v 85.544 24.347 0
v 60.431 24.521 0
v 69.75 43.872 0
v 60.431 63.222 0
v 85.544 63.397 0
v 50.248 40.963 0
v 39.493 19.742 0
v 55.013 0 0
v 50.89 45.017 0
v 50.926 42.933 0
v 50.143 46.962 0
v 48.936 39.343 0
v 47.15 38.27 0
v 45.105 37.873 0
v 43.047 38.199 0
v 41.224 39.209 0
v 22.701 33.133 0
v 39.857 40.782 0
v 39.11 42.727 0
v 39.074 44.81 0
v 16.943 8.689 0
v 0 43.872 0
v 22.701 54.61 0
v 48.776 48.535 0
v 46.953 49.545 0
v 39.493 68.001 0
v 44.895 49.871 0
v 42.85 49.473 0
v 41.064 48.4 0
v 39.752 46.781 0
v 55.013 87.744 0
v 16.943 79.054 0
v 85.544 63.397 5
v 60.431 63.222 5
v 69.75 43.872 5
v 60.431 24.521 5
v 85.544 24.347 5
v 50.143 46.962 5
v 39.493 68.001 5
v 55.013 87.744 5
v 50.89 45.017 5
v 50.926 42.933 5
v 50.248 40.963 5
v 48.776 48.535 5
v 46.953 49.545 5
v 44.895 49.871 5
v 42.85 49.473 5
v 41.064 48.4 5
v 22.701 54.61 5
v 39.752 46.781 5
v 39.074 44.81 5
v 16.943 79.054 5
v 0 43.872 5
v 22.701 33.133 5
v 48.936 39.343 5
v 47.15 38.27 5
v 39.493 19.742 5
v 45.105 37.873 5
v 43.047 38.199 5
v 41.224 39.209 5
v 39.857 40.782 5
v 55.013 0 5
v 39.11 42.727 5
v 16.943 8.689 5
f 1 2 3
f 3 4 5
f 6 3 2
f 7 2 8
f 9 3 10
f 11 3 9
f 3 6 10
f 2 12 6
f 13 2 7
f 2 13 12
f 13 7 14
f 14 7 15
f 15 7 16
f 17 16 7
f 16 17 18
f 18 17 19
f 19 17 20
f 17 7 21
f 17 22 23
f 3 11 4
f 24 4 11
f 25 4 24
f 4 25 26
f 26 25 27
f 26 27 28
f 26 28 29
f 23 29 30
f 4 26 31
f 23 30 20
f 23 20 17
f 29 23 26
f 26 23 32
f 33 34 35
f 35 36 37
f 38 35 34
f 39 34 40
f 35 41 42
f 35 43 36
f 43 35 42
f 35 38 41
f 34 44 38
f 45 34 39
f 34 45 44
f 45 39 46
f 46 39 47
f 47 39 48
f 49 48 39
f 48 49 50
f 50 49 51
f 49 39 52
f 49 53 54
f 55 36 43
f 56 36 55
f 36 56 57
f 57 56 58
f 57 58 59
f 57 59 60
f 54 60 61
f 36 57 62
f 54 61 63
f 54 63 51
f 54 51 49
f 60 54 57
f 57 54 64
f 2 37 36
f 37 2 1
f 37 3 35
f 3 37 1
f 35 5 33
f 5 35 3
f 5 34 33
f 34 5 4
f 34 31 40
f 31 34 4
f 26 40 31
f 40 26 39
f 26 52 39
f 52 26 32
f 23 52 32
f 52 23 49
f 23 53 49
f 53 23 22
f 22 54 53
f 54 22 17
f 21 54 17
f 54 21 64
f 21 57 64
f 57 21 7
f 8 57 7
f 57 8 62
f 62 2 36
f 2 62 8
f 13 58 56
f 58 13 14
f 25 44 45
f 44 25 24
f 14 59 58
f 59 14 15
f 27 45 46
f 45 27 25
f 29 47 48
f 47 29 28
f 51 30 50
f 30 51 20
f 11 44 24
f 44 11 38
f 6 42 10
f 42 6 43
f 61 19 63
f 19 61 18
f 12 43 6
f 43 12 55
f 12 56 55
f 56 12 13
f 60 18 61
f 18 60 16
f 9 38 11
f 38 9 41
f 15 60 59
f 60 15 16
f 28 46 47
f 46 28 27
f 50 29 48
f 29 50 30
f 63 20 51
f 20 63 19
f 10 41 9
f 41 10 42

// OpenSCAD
$fn = 32;

// ----------------------------------------------------------------------
// Star wheel: 7-point star, R45
// ----------------------------------------------------------------------

// --- parameters (mm) ---
n_points = 7;             // number of points / teeth
r_out = 45;               // tip radius
r_in = 24.75;             // root radius
bore_r = 6;               // centre bore radius
plate_t = 5;              // plate thickness, Z (extrusion height)
bore_d = 12;              // centre bore diameter

profile = [[0, 43.872], [22.701, 33.133], [16.943, 8.689], [39.493, 19.742], [55.013, 0], [60.431, 24.521], [85.544, 24.347], [69.75, 43.872], [85.544, 63.397], [60.431, 63.222], [55.013, 87.744], [39.493, 68.001], [16.943, 79.054], [22.701, 54.61]];  // primary outline, 14 points, counter clockwise
void_1 = [[50.89, 45.017], [50.143, 46.962], [48.776, 48.535], [46.953, 49.545], [44.895, 49.871], [42.85, 49.473], [41.064, 48.4], [39.752, 46.781], [39.074, 44.81], [39.11, 42.727], [39.857, 40.782], [41.224, 39.209], [43.047, 38.199], [45.105, 37.873], [47.15, 38.27], [48.936, 39.343], [50.248, 40.963], [50.926, 42.933]];  // centre bore, 18 points

// --- the one profile operation ---
difference() {
  linear_extrude(height = plate_t) polygon(points = profile);
  translate([0, 0, -1])
    linear_extrude(height = plate_t + 2) polygon(points = void_1);
}
